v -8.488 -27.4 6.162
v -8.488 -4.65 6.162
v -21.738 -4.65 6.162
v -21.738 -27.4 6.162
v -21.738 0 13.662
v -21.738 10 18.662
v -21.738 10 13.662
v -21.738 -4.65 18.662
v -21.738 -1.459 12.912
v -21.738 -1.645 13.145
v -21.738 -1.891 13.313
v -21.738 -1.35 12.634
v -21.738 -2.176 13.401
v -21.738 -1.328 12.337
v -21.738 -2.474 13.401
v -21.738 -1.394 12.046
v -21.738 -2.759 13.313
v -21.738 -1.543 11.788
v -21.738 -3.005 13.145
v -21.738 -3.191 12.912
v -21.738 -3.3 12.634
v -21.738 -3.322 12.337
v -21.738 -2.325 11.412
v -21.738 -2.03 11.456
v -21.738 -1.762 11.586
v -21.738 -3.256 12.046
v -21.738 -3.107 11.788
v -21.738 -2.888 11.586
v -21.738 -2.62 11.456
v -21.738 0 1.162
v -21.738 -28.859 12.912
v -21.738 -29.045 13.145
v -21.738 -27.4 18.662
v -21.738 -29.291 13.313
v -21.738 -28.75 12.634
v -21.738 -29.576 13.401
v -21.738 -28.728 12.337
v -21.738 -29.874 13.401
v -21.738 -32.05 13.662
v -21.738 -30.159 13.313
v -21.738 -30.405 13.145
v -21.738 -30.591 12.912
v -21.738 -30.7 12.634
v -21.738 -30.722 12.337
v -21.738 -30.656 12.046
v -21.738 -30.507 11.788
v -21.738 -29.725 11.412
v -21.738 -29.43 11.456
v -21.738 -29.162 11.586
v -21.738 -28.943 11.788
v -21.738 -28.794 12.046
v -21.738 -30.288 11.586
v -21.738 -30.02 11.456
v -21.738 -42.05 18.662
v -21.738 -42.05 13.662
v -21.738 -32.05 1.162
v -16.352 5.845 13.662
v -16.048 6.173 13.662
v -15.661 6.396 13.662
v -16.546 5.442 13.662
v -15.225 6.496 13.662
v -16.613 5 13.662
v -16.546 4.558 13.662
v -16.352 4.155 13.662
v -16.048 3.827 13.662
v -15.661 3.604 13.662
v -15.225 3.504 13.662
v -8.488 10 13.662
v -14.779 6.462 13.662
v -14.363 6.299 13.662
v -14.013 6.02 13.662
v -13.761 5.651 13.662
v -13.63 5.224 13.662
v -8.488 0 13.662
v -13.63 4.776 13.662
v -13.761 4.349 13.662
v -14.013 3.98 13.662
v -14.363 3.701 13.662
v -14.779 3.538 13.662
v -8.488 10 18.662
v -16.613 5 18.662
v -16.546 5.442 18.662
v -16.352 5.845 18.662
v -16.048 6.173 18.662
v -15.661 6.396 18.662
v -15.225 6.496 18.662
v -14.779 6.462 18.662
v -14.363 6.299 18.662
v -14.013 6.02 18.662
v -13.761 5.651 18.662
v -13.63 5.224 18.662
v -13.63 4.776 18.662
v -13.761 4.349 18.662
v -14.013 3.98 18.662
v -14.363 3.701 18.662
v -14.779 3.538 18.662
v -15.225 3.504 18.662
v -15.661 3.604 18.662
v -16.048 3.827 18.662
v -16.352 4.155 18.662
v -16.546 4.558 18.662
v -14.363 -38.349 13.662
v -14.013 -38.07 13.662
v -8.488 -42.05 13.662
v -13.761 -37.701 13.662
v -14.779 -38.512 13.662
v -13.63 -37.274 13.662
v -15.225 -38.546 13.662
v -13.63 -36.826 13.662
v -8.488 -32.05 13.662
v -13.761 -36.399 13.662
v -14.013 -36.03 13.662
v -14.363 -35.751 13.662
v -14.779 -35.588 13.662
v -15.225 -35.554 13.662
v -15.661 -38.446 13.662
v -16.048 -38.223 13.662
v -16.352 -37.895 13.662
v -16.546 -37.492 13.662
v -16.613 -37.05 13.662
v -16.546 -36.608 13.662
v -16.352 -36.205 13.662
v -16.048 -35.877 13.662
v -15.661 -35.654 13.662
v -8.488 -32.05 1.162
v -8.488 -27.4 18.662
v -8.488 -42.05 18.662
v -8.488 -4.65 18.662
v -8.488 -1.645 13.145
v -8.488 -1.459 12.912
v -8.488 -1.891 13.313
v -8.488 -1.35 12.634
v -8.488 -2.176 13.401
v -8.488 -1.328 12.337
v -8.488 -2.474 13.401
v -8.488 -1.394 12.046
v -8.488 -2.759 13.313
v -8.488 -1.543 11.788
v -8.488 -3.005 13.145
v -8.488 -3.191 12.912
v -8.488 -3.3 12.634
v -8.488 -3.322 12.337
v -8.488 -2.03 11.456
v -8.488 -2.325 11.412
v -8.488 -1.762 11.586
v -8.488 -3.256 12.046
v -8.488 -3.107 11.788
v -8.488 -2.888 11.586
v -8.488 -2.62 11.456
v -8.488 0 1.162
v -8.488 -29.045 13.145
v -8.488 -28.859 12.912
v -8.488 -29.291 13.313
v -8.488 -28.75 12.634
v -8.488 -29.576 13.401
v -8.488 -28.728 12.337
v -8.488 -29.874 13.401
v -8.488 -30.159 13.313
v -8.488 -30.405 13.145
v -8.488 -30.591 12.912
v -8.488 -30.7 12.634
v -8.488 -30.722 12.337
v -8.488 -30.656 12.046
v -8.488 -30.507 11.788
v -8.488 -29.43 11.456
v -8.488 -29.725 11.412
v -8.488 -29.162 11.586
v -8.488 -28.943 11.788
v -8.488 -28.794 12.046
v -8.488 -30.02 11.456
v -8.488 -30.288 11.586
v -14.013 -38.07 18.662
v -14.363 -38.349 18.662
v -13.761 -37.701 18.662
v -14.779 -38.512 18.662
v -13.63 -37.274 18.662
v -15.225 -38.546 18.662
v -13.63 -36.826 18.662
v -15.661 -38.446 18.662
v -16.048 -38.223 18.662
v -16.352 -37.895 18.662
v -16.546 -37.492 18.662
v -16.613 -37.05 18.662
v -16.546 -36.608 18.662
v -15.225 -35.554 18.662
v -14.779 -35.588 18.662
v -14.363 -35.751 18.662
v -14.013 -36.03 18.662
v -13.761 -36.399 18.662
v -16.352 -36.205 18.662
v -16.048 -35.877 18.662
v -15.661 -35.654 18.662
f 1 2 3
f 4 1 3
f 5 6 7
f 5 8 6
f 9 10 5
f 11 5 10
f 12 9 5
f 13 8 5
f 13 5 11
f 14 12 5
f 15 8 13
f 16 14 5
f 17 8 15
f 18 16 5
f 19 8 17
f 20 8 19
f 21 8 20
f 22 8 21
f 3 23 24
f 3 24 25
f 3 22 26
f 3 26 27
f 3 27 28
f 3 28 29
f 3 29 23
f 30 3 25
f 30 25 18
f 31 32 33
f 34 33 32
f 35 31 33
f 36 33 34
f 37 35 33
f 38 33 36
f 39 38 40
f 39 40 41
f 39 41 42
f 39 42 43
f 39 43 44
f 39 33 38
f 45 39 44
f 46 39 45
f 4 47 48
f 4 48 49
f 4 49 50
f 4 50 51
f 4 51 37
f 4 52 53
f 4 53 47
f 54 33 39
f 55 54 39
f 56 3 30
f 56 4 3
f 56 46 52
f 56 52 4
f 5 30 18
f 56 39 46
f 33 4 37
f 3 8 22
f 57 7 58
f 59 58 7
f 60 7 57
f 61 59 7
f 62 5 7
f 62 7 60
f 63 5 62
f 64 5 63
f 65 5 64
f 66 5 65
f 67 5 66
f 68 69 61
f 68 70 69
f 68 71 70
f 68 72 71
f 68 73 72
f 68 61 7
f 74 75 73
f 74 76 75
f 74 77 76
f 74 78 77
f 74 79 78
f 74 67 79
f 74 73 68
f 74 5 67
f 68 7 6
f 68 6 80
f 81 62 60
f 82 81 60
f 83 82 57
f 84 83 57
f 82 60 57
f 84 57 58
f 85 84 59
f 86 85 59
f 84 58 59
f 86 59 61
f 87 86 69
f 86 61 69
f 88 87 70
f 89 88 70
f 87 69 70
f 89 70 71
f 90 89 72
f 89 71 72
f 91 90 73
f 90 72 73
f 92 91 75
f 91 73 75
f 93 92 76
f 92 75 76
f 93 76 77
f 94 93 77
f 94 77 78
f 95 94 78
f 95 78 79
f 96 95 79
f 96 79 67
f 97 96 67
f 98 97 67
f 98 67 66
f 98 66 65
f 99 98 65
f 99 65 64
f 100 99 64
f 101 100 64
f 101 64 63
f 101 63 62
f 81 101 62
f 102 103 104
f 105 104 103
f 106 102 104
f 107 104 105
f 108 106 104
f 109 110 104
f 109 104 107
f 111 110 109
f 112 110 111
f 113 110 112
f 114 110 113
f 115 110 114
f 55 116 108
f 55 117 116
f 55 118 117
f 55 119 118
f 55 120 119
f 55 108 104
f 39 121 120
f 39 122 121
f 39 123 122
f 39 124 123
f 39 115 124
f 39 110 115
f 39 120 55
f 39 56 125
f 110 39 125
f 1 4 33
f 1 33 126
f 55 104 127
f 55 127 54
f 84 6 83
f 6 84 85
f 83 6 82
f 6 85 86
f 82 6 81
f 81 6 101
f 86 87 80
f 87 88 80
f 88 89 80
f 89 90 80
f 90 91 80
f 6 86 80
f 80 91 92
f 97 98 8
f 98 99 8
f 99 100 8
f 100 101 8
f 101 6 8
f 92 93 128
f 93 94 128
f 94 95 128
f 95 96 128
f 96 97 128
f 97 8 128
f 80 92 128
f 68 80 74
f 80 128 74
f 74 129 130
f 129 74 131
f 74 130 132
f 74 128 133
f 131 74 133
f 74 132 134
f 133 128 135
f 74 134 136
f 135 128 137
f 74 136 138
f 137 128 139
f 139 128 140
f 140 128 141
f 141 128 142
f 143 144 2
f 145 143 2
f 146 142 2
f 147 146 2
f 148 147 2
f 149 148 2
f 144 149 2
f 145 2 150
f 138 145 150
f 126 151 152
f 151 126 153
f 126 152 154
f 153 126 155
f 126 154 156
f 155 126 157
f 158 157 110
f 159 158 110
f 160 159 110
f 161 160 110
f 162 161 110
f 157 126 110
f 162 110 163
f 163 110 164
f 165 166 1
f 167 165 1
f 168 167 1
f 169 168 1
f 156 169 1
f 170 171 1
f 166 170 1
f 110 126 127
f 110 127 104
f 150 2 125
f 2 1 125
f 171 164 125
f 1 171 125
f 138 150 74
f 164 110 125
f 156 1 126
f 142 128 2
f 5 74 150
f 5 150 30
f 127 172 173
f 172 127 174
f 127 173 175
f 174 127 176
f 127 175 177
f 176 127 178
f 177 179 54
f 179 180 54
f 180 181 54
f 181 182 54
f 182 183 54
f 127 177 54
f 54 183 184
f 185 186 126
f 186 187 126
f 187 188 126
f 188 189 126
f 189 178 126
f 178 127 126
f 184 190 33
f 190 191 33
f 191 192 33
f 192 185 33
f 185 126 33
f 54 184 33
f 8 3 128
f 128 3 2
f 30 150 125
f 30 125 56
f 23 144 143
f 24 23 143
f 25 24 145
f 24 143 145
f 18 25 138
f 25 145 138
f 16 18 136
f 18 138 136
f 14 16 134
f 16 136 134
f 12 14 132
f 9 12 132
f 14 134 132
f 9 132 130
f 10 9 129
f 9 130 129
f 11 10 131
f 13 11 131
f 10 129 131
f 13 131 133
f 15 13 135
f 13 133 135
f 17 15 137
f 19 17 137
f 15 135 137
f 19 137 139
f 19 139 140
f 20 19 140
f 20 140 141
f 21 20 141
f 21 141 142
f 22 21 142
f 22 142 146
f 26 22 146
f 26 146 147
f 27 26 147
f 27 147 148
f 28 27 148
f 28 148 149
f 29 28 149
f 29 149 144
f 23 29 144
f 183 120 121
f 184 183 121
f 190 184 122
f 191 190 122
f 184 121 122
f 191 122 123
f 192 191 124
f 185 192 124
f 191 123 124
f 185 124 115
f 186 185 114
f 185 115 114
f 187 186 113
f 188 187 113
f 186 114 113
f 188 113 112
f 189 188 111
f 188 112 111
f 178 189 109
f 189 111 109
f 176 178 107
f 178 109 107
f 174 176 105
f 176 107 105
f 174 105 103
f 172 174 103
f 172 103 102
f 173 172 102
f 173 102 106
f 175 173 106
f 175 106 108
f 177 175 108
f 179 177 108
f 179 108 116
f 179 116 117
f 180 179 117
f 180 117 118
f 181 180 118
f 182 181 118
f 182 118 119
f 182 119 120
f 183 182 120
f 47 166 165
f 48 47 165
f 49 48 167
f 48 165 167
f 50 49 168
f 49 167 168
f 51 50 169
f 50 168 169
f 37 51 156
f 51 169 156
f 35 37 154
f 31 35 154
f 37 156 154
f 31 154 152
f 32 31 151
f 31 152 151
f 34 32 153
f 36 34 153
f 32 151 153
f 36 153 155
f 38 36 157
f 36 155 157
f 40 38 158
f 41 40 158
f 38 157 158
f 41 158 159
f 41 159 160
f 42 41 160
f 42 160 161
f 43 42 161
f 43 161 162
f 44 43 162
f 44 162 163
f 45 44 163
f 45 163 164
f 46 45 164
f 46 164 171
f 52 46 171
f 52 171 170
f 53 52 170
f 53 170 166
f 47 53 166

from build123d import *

# Parameters (mm, degrees)
ESBO_O1_W                = 13.25
ESBO_O1_H                = 12.5
RESSALTO_EXTRUS_O1_DEPTH = 4.65
ESBO_O2_W                = 13.25
ESBO_O2_H                = 32.05
RESSALTO_EXTRUS_O2_DEPTH = 5
ESBO_O3_W                = 13.25
ESBO_O3_H                = 4.65
RESSALTO_EXTRUS_O3_DEPTH = 12.5
ESBO_O4_W                = 13.25
ESBO_O4_H                = 5
RESSALTO_EXTRUS_O4_DEPTH = 10
ESBO_O5_W                = 13.25
ESBO_O5_H                = 5
RESSALTO_EXTRUS_O5_DEPTH = 10
ESBO_O6_R                = 1.5
CORTE_EXTRUS_O1_DEPTH    = 10
ESBO_O7_R                = 1
CORTE_EXTRUS_O2_DEPTH    = 48.87512604
ESBO_O8_R                = 1
CORTE_EXTRUS_O3_DEPTH    = 48.87512604


with BuildPart() as part:
    # Esboço1 → Ressalto-extrusão1 (new body)
    with BuildSketch(Plane(origin=(0, 0, 0), x_dir=(1, 0, 0), z_dir=(0, 1, 0))):
        with Locations((-15.112918198, -12.411797698)):
            Rectangle(ESBO_O1_W, ESBO_O1_H)
    extrude(amount=-RESSALTO_EXTRUS_O1_DEPTH)

    # Esboço2 → Ressalto-extrusão2 (add)
    with BuildSketch(Plane(origin=(0, 0, 6.161797698), x_dir=(-1, 0, 0), z_dir=(0, 0, -1))):
        with Locations((15.112918198, -16.025)):
            Rectangle(ESBO_O2_W, ESBO_O2_H)
    extrude(amount=RESSALTO_EXTRUS_O2_DEPTH)

    # Esboço3 → Ressalto-extrusão3 (add)
    with BuildSketch(Plane.XY.offset(6.161797698)):
        with Locations((-15.112918198, -29.725)):
            Rectangle(ESBO_O3_W, ESBO_O3_H)
    extrude(amount=RESSALTO_EXTRUS_O3_DEPTH)

    # Esboço4 → Ressalto-extrusão4 (add)
    with BuildSketch(Plane(origin=(0, -32.05, 0), x_dir=(-1, 0, 0), z_dir=(0, -1, 0))):
        with Locations((15.112918198, -16.161797698)):
            Rectangle(ESBO_O4_W, ESBO_O4_H)
    extrude(amount=RESSALTO_EXTRUS_O4_DEPTH)

    # Esboço5 → Ressalto-extrusão5 (add)
    with BuildSketch(Plane(origin=(0, 0, 0), x_dir=(1, 0, 0), z_dir=(0, 1, 0))):
        with Locations((-15.112918198, -16.161797698)):
            Rectangle(ESBO_O5_W, ESBO_O5_H)
    extrude(amount=RESSALTO_EXTRUS_O5_DEPTH)

    # Esboço6 → Corte-extrusão1 (cut)
    with BuildSketch(Plane(origin=(0, 0, 13.661797698), x_dir=(-1, 0, 0), z_dir=(0, 0, -1))):
        with Locations((15.112918198, 5)):
            Circle(ESBO_O6_R)
        with Locations((15.112918198, -37.05)):
            Circle(ESBO_O6_R)
    extrude(amount=-CORTE_EXTRUS_O1_DEPTH, mode=Mode.SUBTRACT)

    # Esboço7 → Corte-extrusão2 (cut, through all)
    with BuildSketch(Plane(origin=(-8.487918198, 0, 0), x_dir=(0, 0, -1), z_dir=(1, 0, 0))):
        with Locations((-12.411797698, -2.325)):
            Circle(ESBO_O7_R)
    extrude(amount=-CORTE_EXTRUS_O2_DEPTH, mode=Mode.SUBTRACT)

    # Esboço8 → Corte-extrusão3 (cut, through all)
    with BuildSketch(Plane(origin=(-8.487918198, 0, 0), x_dir=(0, 0, -1), z_dir=(1, 0, 0))):
        with Locations((-12.411797698, -29.725)):
            Circle(ESBO_O8_R)
    extrude(amount=-CORTE_EXTRUS_O3_DEPTH, mode=Mode.SUBTRACT)


solid = part.part
